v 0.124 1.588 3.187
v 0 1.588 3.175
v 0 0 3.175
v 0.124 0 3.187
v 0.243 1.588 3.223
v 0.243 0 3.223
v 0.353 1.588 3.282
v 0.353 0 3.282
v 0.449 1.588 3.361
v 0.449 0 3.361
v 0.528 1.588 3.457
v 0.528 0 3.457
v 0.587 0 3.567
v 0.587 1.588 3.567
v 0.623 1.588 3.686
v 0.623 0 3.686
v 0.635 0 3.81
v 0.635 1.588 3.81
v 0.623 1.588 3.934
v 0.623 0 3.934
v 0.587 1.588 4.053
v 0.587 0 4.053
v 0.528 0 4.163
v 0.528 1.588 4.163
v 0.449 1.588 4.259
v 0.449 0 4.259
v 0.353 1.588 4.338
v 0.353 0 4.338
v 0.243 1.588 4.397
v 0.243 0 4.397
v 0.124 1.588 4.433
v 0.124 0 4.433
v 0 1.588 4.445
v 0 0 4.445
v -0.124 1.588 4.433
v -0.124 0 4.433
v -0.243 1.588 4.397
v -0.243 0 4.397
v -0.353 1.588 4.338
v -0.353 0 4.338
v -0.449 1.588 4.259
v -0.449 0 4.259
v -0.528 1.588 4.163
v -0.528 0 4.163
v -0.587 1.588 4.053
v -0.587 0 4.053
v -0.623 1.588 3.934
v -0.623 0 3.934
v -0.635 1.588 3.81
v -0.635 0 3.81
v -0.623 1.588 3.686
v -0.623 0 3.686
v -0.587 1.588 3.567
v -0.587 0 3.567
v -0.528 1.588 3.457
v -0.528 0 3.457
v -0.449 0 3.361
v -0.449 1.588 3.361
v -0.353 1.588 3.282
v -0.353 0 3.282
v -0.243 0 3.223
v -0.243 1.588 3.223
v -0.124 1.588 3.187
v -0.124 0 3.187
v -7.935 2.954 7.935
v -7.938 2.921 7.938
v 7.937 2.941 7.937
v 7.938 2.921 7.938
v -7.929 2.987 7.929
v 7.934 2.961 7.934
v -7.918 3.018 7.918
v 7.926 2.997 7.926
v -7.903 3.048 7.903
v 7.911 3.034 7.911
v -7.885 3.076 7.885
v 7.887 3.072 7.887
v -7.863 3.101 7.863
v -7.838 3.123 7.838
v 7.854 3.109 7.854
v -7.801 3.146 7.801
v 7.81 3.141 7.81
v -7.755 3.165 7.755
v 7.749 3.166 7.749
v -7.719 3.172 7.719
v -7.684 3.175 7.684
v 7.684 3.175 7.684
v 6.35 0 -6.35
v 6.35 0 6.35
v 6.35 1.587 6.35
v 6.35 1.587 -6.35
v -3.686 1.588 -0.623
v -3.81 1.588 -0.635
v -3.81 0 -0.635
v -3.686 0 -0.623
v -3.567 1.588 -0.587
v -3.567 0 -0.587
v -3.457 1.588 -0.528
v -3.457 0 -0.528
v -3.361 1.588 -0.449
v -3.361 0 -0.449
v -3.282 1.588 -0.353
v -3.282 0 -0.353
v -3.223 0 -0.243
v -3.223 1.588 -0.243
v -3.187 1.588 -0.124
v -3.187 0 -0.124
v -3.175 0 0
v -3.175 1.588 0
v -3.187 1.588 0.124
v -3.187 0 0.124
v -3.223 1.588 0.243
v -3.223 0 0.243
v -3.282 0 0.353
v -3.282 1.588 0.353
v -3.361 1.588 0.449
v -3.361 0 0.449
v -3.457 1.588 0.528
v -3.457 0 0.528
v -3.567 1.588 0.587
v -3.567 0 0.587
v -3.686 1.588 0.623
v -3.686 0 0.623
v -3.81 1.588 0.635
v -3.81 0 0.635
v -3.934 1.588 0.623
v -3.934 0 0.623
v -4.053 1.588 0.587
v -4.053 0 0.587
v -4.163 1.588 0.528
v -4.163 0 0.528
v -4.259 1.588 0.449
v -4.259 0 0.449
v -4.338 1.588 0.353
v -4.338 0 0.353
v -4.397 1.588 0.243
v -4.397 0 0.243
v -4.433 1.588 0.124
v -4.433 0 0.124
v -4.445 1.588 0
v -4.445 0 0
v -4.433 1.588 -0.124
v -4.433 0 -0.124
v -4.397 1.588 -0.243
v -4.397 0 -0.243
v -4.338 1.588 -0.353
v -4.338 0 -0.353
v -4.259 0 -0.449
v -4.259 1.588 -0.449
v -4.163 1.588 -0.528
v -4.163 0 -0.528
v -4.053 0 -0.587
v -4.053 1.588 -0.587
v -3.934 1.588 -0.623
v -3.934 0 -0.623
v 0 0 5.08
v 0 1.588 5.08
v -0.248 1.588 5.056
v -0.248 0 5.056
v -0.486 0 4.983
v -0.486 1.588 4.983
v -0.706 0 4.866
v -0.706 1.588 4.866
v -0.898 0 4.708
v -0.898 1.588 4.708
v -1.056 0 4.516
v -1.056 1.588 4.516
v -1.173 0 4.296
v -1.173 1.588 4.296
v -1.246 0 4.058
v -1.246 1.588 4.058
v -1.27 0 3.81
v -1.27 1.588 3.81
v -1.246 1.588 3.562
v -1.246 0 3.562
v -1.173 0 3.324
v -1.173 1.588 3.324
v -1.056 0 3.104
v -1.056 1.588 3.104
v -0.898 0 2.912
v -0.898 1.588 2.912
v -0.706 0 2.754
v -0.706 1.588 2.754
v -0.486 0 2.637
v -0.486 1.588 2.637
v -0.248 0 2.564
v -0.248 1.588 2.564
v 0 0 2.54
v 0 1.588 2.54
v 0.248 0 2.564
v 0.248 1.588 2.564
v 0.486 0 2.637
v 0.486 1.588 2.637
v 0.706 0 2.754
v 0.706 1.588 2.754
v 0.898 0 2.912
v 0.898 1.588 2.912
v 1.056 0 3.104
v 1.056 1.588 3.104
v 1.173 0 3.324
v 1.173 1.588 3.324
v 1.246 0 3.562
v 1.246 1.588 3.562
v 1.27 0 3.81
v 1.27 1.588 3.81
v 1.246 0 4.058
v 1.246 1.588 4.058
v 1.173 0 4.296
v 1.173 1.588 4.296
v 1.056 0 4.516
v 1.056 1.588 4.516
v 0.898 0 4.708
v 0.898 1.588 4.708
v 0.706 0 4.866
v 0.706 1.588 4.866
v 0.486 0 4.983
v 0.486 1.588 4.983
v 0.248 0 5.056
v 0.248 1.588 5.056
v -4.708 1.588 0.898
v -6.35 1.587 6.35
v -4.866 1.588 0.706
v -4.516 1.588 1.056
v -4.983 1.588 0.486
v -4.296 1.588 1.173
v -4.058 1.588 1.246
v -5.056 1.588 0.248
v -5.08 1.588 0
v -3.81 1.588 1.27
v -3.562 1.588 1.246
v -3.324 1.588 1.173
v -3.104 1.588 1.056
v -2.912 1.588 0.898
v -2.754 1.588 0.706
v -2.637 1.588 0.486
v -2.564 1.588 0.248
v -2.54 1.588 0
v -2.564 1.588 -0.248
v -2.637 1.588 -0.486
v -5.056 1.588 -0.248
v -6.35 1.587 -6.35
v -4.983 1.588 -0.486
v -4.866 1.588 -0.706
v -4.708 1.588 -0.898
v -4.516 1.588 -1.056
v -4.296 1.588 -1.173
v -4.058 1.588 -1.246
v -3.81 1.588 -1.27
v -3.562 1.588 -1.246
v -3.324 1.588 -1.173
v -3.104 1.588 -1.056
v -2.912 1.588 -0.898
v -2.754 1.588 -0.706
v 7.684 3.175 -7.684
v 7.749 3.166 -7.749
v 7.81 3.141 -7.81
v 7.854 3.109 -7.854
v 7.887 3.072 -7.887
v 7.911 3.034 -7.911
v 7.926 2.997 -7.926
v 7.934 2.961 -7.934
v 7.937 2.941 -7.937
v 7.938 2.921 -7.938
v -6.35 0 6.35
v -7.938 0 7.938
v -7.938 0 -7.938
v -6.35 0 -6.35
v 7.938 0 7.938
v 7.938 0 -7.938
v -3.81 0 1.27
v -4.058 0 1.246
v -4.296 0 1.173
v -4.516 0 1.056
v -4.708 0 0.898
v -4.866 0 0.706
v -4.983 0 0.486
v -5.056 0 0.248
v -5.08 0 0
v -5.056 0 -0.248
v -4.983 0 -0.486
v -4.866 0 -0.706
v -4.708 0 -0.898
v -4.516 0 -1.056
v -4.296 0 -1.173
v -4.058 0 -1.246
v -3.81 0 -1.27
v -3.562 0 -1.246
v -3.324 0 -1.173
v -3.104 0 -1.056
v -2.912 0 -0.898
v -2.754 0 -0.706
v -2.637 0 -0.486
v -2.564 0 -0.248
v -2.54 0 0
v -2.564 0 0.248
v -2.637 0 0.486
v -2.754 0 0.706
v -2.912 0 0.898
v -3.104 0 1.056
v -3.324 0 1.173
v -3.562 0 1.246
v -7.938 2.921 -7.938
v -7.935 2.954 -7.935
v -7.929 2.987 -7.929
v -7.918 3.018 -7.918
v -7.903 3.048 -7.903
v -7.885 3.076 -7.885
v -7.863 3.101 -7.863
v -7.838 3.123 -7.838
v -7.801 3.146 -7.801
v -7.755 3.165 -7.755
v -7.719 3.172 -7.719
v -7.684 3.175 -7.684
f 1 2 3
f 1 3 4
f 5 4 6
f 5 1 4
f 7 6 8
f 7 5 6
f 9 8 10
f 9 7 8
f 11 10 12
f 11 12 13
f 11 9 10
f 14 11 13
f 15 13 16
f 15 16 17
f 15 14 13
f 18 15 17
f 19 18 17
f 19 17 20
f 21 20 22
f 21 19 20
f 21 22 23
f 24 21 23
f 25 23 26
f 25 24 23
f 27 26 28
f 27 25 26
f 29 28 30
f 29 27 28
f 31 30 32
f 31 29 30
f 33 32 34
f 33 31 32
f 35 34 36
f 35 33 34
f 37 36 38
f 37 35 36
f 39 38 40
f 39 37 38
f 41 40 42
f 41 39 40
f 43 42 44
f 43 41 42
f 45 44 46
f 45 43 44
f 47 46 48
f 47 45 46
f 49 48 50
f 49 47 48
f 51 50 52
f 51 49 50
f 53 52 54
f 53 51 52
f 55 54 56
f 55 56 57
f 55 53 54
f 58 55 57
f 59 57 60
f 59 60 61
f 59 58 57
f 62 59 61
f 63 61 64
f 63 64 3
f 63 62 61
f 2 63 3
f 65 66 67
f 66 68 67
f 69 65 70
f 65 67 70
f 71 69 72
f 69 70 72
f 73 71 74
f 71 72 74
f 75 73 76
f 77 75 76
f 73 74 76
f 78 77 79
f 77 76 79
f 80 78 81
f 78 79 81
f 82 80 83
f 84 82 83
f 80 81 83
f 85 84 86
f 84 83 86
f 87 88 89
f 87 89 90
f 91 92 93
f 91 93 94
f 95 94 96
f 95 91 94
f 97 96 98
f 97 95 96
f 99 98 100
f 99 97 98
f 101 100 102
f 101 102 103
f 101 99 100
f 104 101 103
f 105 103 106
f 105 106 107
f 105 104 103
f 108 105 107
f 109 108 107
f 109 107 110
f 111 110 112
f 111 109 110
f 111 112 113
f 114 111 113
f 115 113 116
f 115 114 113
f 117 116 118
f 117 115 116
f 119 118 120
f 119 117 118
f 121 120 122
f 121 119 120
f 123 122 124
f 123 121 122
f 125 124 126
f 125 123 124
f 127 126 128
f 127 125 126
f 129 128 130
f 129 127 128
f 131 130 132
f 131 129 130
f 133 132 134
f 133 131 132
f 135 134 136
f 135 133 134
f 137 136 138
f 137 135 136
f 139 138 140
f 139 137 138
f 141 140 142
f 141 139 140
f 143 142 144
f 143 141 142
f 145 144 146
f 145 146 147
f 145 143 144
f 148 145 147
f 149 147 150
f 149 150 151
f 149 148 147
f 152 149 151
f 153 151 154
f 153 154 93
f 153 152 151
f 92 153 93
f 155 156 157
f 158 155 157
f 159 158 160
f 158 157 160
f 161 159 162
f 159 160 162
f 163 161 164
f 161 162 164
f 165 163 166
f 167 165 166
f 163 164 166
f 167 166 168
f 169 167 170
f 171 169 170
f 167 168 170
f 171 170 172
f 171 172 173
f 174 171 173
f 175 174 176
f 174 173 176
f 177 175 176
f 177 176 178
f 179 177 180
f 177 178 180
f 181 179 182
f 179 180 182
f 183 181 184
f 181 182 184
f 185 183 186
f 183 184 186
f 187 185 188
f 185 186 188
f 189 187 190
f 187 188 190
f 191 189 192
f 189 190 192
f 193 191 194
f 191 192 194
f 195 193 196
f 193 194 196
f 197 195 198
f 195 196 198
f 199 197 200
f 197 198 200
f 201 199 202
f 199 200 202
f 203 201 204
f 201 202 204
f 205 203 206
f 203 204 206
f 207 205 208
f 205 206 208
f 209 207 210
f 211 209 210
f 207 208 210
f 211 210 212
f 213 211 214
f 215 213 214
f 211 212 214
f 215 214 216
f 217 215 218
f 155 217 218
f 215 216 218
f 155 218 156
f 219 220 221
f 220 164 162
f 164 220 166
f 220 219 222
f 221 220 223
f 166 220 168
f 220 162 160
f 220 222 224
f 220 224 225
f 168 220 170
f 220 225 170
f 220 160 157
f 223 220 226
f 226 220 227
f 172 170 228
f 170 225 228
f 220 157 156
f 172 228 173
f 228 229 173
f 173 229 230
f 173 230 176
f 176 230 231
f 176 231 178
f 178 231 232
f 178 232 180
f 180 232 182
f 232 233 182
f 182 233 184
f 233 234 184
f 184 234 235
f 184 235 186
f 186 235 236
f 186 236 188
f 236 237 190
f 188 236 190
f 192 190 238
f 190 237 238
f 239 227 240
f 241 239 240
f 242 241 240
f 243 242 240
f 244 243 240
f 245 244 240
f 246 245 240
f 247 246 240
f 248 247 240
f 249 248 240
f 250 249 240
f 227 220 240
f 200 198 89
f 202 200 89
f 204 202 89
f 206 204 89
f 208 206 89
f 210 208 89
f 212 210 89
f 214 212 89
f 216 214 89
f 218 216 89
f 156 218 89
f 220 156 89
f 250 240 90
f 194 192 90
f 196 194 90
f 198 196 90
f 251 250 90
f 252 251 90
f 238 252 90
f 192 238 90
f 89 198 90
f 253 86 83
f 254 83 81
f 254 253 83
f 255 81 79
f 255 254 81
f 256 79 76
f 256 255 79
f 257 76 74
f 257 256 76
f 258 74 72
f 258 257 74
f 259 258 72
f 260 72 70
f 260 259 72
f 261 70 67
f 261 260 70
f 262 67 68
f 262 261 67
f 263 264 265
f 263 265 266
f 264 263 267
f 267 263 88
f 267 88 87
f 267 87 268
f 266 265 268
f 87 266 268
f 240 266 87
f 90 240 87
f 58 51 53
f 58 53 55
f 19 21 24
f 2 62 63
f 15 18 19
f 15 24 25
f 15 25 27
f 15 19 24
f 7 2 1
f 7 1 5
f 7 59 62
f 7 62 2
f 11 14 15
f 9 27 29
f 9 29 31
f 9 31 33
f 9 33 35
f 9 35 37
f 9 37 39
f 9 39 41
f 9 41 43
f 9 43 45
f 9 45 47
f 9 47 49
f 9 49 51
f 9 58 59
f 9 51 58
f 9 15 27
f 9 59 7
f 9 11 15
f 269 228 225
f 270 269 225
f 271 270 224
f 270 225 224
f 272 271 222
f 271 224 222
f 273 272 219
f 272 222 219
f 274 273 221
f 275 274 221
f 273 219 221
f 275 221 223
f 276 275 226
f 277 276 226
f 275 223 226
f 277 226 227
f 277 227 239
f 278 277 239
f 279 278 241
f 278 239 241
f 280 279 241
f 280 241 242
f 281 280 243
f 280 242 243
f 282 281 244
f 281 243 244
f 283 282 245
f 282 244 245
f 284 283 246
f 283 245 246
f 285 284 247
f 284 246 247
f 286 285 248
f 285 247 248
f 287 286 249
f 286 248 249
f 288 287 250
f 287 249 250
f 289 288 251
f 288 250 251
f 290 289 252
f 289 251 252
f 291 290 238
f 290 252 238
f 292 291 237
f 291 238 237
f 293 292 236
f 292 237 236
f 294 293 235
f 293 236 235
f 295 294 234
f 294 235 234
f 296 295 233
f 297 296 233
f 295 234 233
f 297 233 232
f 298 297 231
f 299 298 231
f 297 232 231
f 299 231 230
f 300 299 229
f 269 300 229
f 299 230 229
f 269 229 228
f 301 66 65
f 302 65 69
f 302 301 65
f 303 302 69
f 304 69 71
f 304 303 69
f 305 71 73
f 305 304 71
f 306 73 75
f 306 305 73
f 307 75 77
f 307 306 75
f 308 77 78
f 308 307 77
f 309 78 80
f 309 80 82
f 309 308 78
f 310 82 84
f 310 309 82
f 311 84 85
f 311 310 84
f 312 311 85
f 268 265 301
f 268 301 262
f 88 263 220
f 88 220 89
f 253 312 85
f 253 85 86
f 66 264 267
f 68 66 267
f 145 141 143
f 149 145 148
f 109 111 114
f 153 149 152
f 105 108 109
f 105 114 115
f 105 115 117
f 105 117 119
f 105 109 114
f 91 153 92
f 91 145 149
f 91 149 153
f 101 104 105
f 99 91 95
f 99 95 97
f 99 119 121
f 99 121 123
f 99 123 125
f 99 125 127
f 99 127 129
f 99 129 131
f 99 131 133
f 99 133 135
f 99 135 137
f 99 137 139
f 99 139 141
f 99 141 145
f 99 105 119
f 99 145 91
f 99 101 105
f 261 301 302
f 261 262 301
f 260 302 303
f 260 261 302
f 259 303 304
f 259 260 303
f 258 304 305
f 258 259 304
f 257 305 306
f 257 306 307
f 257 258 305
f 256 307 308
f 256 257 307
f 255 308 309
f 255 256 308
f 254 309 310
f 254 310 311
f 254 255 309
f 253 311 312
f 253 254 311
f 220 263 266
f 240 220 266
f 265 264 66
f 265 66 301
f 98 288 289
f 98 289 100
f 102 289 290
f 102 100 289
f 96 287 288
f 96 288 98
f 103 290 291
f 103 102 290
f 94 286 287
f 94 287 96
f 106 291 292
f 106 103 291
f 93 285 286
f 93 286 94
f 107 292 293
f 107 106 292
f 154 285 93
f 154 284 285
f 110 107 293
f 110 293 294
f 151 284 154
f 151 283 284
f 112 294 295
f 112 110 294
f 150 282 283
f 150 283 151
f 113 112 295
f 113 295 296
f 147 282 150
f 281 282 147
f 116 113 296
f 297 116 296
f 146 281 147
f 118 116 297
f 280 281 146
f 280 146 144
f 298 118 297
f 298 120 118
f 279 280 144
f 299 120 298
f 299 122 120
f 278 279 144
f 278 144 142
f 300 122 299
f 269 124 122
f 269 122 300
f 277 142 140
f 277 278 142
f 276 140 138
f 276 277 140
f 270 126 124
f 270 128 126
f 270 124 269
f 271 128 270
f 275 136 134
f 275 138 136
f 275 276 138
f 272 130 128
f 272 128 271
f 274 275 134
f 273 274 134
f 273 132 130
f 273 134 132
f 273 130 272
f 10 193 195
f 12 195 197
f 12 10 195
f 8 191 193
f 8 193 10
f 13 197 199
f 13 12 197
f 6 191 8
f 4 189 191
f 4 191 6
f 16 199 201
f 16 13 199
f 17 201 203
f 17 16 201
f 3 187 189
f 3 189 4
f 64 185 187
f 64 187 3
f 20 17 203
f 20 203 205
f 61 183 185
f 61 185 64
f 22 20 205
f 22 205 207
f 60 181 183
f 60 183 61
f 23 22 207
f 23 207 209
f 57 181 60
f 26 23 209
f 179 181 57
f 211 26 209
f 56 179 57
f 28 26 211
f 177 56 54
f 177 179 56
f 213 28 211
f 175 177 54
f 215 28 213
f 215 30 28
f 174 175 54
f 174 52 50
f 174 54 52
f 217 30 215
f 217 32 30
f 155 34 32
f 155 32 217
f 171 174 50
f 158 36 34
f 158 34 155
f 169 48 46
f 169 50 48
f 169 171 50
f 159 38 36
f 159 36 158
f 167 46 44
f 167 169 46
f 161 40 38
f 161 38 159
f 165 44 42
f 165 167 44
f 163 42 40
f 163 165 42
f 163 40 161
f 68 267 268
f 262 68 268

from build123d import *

# Parameters (mm, degrees)
SKETCH1_W           = 15.875
SKETCH1_H           = 15.875
BASE_EXTRUDE_DEPTH  = 3.175
SHELL1_T            = -1.5875
SKETCH4_R           = 1.27
BOSS_EXTRUDE2_DEPTH = 1.5875
CUT_EXTRUDE2_START  = -1.5875
SKETCH5_R           = 0.635
CUT_EXTRUDE2_DEPTH  = 1.5875
FILLET1_R           = 0.254


with BuildPart() as part:
    # Sketch1 → Base-Extrude (new body)
    with BuildSketch(Plane(origin=(0, 0, 0), x_dir=(1, 0, 0), z_dir=(0, 1, 0))):
        Rectangle(SKETCH1_W, SKETCH1_H)
    extrude(amount=BASE_EXTRUDE_DEPTH)

    # Shell1
    shell1_openings = [part.faces().sort_by_distance(p)[0] for p in [
        (0, 0, 0),
    ]]
    offset(amount=SHELL1_T, openings=shell1_openings, kind=Kind.INTERSECTION)

    # Sketch4 → Boss-Extrude2 (add)
    with BuildSketch(Plane.XZ.offset(-1.5875)):
        with Locations(Location((-3.81, 0, 0), (0, 0, 90))):
            Circle(SKETCH4_R)
        with Locations(Location((0, 3.81, 0), (0, 0, 90))):
            Circle(SKETCH4_R)
    extrude(amount=BOSS_EXTRUDE2_DEPTH)

    # Sketch5 → Cut-Extrude2 (cut)
    with BuildSketch(Plane.XZ.offset(CUT_EXTRUDE2_START)):
        with Locations(Location((0, 3.81, 0), (0, 0, 270))):
            Circle(SKETCH5_R)
        with Locations(Location((-3.81, 0, 0), (0, 0, 270))):
            Circle(SKETCH5_R)
    extrude(amount=CUT_EXTRUDE2_DEPTH, mode=Mode.SUBTRACT)

    # Fillet1
    fillet1_edges = [part.edges().sort_by_distance(p)[0] for p in [
        (7.9375, 3.175, 0),
        (0, 3.175, -7.9375),
        (-7.9375, 3.175, 0),
        (0, 3.175, 7.9375),
    ]]
    fillet(fillet1_edges, radius=FILLET1_R)


solid = part.part
